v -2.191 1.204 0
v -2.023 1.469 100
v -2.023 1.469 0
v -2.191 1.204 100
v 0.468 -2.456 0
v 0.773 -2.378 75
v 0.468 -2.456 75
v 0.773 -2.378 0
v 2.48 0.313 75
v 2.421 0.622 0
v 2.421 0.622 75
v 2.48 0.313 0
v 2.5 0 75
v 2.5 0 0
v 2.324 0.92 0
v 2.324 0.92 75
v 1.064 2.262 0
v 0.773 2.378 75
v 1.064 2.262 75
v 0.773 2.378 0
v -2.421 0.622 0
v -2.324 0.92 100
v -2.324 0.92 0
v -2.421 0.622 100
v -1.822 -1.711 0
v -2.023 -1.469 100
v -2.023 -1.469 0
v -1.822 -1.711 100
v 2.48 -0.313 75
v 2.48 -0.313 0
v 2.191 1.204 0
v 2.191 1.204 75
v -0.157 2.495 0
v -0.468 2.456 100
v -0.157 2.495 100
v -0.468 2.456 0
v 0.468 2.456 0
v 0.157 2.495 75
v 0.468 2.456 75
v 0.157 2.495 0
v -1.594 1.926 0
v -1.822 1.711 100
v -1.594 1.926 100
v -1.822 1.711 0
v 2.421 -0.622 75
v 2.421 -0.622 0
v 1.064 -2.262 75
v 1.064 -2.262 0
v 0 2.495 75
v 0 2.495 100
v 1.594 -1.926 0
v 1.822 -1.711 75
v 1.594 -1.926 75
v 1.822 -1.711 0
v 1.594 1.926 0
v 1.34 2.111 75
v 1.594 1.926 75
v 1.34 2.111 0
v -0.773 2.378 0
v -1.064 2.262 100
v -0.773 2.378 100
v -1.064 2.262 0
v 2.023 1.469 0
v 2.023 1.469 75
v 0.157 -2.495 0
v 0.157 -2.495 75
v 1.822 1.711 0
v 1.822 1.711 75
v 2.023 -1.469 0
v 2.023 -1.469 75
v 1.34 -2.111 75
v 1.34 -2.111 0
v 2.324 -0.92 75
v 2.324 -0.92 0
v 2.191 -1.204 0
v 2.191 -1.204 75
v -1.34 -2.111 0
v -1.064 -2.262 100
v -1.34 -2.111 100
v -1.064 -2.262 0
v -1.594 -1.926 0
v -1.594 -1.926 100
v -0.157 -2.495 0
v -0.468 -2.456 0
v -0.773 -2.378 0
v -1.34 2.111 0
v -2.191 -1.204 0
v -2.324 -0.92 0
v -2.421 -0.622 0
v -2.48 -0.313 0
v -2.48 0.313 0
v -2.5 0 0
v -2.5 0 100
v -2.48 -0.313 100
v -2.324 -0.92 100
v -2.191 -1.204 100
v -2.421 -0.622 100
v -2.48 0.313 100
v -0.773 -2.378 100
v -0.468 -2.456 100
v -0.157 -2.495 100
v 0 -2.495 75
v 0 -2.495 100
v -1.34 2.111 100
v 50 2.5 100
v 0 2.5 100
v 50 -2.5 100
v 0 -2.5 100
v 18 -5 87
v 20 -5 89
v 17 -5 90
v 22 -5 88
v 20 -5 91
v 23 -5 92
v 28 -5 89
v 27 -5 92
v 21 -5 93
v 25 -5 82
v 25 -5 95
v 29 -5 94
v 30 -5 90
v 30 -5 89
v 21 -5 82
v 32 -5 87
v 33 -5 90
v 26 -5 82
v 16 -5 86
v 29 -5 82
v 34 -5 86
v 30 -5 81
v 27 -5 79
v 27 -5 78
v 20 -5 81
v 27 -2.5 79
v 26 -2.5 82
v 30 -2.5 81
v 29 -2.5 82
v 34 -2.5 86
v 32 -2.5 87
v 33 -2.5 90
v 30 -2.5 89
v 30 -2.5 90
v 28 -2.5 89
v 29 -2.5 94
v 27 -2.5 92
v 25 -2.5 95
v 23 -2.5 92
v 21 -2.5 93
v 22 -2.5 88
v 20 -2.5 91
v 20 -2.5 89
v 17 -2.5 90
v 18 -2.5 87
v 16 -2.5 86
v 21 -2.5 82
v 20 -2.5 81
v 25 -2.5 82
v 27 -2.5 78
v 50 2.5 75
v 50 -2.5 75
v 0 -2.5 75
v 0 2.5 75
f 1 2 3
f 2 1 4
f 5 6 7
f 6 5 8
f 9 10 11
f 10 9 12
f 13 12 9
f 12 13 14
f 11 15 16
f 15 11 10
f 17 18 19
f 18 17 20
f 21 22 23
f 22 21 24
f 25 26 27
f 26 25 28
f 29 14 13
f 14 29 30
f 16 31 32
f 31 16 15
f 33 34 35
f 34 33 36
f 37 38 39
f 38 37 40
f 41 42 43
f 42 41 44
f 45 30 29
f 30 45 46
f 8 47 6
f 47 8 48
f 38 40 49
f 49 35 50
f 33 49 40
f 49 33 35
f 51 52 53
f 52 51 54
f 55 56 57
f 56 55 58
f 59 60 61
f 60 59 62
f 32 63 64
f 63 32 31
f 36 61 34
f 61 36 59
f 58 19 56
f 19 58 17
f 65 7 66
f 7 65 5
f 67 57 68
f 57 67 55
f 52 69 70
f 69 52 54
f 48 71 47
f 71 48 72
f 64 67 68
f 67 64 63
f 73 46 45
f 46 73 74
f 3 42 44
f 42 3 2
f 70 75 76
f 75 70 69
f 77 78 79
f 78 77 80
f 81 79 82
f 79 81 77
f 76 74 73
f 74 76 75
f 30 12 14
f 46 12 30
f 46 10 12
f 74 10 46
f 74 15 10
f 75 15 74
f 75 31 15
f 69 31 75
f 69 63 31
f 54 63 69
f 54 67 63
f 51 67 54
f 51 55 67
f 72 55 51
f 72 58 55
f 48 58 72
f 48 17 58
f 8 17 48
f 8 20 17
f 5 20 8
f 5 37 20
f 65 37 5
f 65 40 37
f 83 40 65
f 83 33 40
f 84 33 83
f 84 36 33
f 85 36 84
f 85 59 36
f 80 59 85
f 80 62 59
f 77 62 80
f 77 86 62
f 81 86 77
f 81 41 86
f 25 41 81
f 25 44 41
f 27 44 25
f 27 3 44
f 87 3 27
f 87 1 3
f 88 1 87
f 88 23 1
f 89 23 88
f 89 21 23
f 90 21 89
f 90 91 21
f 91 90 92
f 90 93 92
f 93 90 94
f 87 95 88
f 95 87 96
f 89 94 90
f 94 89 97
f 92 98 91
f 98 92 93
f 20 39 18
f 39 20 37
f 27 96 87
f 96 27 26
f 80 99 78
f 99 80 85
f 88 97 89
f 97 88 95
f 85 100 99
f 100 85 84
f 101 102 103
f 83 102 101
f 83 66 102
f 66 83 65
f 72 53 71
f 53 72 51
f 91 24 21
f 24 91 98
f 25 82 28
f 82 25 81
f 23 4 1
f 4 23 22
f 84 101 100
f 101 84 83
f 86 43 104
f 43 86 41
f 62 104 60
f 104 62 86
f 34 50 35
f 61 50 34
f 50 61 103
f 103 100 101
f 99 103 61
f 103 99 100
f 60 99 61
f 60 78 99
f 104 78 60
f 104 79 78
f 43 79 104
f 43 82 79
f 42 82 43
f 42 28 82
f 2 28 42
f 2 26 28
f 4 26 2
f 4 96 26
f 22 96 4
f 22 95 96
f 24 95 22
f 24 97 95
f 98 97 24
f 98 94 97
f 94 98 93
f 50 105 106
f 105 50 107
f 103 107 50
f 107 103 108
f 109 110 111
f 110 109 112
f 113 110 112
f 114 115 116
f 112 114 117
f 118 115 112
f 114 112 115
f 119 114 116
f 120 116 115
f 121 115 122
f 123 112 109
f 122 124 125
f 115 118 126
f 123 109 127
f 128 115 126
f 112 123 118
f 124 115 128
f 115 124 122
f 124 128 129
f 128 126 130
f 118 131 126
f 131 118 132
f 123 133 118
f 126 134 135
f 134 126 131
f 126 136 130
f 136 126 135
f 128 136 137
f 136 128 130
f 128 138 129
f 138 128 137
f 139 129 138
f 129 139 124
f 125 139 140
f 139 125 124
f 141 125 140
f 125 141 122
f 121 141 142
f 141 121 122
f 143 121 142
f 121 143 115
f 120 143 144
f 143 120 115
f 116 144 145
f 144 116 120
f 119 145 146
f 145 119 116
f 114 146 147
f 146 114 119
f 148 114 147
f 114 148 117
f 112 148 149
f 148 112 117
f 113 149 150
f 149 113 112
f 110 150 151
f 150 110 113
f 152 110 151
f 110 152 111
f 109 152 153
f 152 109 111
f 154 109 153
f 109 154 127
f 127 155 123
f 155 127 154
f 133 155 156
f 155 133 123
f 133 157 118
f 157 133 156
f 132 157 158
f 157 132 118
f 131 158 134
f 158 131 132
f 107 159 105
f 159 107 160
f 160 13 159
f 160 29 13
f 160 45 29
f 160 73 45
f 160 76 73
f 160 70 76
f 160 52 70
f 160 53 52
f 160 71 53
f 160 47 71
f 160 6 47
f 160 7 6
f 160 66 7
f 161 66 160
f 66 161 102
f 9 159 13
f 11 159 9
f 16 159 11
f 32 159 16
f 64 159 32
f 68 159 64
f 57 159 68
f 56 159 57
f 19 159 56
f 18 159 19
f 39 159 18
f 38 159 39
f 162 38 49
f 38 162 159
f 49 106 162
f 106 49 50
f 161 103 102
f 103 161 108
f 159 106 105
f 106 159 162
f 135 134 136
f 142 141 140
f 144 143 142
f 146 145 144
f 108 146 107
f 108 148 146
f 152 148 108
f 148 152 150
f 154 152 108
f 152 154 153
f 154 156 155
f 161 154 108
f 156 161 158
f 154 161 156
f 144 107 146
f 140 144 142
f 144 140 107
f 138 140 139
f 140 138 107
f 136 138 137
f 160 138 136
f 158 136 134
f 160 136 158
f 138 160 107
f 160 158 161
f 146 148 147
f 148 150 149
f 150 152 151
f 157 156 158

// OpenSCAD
/*
 * The union function combines two objects into single model where they intersect.
 * Union can be used for both 2D and 3D objects but cannot mix dimensions.
 */
union() {
    cylinder(d = 5, h = 100, $fn = 50); // Flag pole.

    translate([25, 0, 85]) { // Move up flag pole and to the right.
        rotate([90, 0, 0]) { // Orient maple leaf wrt. pole.
            linear_extrude(height = 5) { // Convert 2D to 3D.
                // Polygon with vertices made to look like a maple leaf.
                polygon(points = [[1, -3], [5, -4], [4, -3], [9, 1], [7, 2], [8, 5], [5, 4], [5, 5],
                        [3, 4], [4, 9], [2, 7], [0,10], [-2, 7], [-4, 8], [-3, 3], [-5, 6],
                        [-5, 4], [-8, 5], [-7, 2], [-9, 1], [-4, -3], [-5,-4], [0, -3], [2, -7],
                        [2, -6], [1, -3]]);
            }
        }
    }

    translate([0, -2.5, 75]) // Move flag backing to the top of pole and center.
        cube([50, 5, 25]); // Flag back, to be connected to pole and maple leaf.
}
